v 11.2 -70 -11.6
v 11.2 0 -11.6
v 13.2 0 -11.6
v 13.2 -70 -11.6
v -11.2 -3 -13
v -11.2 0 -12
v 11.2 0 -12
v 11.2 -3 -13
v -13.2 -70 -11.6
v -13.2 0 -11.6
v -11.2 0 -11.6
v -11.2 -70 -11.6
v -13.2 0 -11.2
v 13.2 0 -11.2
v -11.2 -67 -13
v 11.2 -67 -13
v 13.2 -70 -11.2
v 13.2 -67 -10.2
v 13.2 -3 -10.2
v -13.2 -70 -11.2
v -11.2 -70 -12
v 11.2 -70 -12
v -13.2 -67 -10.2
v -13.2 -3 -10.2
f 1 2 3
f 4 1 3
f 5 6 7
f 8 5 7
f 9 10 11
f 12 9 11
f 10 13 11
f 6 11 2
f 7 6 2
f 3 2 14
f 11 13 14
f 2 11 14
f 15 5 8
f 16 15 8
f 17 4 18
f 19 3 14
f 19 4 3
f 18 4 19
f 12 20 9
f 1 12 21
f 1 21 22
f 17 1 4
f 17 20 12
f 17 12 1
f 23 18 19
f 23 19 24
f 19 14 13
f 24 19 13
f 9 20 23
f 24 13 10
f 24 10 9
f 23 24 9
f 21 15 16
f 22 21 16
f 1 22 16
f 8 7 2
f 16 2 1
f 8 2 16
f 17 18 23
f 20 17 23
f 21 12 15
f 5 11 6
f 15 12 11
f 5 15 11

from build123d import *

# Parameters (mm, degrees)
F1_DEPTH   = 70
F2_SIZE2   = 3
F2_SIZE    = 1
F3_SIZE2   = 1
F3_SIZE    = 3
F3_2_SIZE2 = 1
F3_2_SIZE  = 3


with BuildPart() as f1:
    # F0 (on Front) → F1 (new body)
    with BuildSketch(Plane.XZ):
        Polygon((13.2, -10.2), (0, -10.2), (0, -13), (11.2, -13), (11.2, -11.6), (13.2, -11.6), align=None)
        Polygon((0, -13), (0, -10.2), (-13.2, -10.2), (-13.2, -11.6), (-11.2, -11.6), (-11.2, -13), align=None)
    extrude(amount=F1_DEPTH)

    # F2
    f2_edges = [f1.edges().sort_by_distance(p)[0] for p in [
        (0, -70, -13),
        (0, -70, -10.2),
    ]]
    f2_side = f1.faces().sort_by_distance((0, -70, -11.542623))[0]
    chamfer(f2_edges, length=F2_SIZE, length2=F2_SIZE2, reference=f2_side)

    # F3
    f3_edges = [f1.edges().sort_by_distance(p)[0] for p in [
        (0, 0, -10.2),
    ]]
    f3_side = f1.faces().sort_by_distance((0, -33.5, -10.2))[0]
    chamfer(f3_edges, length=F3_SIZE, length2=F3_SIZE2, reference=f3_side)

    # F3#2
    f3_2_edges = [f1.edges().sort_by_distance(p)[0] for p in [
        (0, 0, -13),
    ]]
    f3_2_side = f1.faces().sort_by_distance((0, -33.5, -13))[0]
    chamfer(f3_2_edges, length=F3_2_SIZE, length2=F3_2_SIZE2, reference=f3_2_side)


solid = f1.part
